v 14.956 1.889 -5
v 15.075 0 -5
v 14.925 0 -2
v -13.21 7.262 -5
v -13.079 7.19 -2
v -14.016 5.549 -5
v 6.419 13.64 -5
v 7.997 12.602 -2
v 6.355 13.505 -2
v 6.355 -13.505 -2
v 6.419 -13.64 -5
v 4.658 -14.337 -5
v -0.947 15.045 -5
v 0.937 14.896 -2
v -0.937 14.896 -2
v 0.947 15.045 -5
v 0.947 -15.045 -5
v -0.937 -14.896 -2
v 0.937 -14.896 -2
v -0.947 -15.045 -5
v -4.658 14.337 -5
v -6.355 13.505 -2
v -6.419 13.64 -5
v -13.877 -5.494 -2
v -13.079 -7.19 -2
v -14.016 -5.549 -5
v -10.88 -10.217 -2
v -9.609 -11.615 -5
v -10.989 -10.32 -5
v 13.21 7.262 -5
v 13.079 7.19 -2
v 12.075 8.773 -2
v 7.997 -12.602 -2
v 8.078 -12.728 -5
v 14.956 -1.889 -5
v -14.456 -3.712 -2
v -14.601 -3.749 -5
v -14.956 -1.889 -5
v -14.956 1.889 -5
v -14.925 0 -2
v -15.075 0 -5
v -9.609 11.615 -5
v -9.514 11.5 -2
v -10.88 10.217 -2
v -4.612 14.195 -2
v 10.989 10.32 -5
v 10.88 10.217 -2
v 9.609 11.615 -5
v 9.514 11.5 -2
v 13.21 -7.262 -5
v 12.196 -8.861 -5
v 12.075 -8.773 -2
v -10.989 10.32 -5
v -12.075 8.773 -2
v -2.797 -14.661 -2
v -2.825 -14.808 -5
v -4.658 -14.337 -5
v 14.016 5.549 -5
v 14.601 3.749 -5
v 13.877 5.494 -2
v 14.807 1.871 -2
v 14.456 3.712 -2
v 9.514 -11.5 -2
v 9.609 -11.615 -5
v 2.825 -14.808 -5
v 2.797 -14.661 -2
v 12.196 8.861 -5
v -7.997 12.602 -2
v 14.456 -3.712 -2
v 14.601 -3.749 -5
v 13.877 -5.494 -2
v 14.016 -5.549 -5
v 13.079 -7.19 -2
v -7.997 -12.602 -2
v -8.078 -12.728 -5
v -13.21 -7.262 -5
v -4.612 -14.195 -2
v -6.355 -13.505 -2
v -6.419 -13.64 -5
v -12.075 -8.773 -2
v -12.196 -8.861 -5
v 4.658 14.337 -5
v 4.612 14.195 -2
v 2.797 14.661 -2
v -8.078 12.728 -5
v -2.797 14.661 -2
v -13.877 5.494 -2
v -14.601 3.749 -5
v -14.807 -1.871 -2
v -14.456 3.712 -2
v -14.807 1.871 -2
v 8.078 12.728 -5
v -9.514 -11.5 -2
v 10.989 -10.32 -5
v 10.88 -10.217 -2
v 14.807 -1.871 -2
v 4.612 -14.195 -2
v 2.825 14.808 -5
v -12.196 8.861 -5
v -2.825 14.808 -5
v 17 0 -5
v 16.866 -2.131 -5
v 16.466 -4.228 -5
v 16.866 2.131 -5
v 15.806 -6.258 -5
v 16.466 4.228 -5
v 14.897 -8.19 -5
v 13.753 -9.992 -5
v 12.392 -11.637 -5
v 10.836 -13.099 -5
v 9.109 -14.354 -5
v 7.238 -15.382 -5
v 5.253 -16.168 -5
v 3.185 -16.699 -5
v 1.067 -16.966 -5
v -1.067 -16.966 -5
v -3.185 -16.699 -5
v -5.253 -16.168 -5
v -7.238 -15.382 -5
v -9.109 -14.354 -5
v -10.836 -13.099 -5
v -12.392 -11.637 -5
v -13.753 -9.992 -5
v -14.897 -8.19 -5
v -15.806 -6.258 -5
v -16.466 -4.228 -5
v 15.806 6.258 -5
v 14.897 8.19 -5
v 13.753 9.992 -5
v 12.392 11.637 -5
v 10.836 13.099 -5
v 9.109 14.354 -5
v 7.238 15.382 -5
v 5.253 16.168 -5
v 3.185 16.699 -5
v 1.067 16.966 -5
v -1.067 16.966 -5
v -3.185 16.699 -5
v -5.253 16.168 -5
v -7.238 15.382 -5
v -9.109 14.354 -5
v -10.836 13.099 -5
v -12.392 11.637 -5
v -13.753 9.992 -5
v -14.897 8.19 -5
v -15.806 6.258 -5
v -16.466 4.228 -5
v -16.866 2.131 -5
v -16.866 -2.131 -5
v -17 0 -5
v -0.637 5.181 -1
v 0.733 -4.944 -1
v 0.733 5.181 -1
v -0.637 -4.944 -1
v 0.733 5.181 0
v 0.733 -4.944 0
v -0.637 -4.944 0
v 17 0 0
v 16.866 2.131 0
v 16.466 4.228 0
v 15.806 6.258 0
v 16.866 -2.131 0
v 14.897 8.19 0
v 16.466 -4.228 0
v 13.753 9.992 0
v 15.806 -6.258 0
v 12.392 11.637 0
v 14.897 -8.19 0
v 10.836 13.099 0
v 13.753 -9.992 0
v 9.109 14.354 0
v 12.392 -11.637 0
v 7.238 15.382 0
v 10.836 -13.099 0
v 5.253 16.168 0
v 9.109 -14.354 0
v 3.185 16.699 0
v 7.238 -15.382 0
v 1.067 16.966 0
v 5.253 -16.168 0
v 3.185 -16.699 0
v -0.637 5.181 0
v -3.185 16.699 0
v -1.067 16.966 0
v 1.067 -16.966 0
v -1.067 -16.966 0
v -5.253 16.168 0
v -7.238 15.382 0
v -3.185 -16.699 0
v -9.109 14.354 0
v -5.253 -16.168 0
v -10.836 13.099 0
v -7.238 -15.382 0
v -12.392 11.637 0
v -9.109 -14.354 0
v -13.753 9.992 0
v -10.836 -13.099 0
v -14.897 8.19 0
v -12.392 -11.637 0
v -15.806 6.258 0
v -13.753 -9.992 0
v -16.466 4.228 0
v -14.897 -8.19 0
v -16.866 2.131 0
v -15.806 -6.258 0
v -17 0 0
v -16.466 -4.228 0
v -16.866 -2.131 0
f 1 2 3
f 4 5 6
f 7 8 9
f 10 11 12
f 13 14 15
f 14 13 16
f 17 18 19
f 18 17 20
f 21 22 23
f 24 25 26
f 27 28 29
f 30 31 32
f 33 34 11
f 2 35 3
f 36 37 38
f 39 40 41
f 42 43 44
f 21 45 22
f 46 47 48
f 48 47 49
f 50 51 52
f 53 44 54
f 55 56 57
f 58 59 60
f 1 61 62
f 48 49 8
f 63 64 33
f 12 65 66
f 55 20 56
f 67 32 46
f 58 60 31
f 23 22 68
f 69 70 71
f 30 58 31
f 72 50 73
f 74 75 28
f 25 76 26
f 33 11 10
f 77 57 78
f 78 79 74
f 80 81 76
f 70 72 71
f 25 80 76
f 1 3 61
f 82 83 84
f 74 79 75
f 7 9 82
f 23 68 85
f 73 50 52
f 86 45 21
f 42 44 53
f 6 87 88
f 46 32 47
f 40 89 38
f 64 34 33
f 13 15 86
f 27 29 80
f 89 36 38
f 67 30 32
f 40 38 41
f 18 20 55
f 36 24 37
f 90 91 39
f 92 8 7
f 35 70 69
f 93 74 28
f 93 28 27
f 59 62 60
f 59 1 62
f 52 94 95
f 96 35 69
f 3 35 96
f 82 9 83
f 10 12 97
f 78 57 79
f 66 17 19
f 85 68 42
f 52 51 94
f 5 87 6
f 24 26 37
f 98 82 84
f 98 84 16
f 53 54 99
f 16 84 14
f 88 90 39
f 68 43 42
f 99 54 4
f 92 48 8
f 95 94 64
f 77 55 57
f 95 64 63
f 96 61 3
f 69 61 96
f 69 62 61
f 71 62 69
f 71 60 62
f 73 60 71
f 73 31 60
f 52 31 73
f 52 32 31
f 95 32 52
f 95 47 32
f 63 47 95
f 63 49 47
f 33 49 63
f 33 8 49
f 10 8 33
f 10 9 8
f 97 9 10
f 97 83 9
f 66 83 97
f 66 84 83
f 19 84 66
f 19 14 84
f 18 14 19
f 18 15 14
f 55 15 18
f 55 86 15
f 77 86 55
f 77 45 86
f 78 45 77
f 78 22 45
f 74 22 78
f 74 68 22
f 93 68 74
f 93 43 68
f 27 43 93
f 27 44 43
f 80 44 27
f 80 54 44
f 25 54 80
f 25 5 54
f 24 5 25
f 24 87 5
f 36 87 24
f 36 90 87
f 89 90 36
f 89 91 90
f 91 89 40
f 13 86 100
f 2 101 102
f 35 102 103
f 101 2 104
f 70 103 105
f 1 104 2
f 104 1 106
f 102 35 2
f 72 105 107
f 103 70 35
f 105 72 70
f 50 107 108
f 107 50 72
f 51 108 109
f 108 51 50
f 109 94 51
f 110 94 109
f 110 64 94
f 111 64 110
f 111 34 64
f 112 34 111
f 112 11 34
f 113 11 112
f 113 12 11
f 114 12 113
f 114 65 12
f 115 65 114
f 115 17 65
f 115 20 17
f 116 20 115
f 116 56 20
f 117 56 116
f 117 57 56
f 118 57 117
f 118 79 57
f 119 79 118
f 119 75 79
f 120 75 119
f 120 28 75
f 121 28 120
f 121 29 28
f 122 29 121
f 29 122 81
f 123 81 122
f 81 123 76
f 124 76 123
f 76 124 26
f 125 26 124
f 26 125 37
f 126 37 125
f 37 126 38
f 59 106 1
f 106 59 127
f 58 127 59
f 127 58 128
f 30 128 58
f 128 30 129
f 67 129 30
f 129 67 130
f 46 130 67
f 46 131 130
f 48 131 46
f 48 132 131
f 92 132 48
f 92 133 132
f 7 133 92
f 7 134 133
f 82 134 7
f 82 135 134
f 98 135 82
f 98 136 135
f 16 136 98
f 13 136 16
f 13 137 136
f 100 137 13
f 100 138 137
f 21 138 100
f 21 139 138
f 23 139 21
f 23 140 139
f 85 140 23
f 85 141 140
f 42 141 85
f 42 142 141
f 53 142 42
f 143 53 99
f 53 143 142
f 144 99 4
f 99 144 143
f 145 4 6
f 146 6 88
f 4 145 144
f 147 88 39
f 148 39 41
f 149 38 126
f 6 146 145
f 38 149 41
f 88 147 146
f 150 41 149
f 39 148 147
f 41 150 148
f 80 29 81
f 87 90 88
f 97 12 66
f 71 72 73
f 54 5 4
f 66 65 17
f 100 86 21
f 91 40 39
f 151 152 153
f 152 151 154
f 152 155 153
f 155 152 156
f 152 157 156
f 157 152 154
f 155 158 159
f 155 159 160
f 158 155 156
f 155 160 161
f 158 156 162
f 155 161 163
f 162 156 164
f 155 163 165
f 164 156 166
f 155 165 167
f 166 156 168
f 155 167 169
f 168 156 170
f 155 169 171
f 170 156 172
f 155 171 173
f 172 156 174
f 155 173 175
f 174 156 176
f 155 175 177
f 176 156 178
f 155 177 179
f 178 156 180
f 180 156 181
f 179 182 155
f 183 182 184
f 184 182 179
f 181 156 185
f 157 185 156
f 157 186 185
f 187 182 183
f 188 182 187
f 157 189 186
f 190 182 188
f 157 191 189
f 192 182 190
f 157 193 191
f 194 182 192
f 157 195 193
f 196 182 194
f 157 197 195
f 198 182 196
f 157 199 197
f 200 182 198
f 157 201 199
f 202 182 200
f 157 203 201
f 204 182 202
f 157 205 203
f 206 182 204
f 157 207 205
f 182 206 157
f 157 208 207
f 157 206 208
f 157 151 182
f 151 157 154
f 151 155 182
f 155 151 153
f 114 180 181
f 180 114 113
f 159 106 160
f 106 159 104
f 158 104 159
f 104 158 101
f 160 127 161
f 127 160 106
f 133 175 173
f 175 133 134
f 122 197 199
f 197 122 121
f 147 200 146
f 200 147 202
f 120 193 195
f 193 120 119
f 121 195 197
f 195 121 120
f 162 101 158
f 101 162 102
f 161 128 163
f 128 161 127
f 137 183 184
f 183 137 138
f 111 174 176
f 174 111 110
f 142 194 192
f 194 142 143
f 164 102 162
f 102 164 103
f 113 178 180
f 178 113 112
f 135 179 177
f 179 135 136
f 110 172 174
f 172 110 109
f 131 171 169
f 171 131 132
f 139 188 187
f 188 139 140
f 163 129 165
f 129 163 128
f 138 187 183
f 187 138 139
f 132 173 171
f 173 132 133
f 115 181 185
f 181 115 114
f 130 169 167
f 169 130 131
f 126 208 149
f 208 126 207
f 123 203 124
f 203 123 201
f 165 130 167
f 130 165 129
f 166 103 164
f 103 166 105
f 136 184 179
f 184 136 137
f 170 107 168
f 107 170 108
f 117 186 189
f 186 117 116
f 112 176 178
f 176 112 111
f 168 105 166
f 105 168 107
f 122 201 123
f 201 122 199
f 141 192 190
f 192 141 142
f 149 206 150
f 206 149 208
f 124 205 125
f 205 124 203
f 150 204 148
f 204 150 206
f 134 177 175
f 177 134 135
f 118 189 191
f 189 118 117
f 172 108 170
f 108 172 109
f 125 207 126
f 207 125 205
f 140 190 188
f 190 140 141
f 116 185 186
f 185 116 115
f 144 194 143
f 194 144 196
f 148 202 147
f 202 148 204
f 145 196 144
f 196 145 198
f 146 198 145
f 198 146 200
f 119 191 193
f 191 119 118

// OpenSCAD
$fn = 50;

difference() {
	union() {
		translate(v = [0, 0, -5.0]) {
			cylinder(h = 5, r = 17.0);
		}
	}
	union() {
		#translate(v = [0, 0, -5.0]) {
			cylinder(h = 3, r1 = 15.075, r2 = 14.925);
		}
		translate(v = [0, 0, -1]) {
			linear_extrude(height = 1) {
				text(font = "Impact", halign = "center", size = 10, text = "I", valign = "center");
			}
		}
	}
}
